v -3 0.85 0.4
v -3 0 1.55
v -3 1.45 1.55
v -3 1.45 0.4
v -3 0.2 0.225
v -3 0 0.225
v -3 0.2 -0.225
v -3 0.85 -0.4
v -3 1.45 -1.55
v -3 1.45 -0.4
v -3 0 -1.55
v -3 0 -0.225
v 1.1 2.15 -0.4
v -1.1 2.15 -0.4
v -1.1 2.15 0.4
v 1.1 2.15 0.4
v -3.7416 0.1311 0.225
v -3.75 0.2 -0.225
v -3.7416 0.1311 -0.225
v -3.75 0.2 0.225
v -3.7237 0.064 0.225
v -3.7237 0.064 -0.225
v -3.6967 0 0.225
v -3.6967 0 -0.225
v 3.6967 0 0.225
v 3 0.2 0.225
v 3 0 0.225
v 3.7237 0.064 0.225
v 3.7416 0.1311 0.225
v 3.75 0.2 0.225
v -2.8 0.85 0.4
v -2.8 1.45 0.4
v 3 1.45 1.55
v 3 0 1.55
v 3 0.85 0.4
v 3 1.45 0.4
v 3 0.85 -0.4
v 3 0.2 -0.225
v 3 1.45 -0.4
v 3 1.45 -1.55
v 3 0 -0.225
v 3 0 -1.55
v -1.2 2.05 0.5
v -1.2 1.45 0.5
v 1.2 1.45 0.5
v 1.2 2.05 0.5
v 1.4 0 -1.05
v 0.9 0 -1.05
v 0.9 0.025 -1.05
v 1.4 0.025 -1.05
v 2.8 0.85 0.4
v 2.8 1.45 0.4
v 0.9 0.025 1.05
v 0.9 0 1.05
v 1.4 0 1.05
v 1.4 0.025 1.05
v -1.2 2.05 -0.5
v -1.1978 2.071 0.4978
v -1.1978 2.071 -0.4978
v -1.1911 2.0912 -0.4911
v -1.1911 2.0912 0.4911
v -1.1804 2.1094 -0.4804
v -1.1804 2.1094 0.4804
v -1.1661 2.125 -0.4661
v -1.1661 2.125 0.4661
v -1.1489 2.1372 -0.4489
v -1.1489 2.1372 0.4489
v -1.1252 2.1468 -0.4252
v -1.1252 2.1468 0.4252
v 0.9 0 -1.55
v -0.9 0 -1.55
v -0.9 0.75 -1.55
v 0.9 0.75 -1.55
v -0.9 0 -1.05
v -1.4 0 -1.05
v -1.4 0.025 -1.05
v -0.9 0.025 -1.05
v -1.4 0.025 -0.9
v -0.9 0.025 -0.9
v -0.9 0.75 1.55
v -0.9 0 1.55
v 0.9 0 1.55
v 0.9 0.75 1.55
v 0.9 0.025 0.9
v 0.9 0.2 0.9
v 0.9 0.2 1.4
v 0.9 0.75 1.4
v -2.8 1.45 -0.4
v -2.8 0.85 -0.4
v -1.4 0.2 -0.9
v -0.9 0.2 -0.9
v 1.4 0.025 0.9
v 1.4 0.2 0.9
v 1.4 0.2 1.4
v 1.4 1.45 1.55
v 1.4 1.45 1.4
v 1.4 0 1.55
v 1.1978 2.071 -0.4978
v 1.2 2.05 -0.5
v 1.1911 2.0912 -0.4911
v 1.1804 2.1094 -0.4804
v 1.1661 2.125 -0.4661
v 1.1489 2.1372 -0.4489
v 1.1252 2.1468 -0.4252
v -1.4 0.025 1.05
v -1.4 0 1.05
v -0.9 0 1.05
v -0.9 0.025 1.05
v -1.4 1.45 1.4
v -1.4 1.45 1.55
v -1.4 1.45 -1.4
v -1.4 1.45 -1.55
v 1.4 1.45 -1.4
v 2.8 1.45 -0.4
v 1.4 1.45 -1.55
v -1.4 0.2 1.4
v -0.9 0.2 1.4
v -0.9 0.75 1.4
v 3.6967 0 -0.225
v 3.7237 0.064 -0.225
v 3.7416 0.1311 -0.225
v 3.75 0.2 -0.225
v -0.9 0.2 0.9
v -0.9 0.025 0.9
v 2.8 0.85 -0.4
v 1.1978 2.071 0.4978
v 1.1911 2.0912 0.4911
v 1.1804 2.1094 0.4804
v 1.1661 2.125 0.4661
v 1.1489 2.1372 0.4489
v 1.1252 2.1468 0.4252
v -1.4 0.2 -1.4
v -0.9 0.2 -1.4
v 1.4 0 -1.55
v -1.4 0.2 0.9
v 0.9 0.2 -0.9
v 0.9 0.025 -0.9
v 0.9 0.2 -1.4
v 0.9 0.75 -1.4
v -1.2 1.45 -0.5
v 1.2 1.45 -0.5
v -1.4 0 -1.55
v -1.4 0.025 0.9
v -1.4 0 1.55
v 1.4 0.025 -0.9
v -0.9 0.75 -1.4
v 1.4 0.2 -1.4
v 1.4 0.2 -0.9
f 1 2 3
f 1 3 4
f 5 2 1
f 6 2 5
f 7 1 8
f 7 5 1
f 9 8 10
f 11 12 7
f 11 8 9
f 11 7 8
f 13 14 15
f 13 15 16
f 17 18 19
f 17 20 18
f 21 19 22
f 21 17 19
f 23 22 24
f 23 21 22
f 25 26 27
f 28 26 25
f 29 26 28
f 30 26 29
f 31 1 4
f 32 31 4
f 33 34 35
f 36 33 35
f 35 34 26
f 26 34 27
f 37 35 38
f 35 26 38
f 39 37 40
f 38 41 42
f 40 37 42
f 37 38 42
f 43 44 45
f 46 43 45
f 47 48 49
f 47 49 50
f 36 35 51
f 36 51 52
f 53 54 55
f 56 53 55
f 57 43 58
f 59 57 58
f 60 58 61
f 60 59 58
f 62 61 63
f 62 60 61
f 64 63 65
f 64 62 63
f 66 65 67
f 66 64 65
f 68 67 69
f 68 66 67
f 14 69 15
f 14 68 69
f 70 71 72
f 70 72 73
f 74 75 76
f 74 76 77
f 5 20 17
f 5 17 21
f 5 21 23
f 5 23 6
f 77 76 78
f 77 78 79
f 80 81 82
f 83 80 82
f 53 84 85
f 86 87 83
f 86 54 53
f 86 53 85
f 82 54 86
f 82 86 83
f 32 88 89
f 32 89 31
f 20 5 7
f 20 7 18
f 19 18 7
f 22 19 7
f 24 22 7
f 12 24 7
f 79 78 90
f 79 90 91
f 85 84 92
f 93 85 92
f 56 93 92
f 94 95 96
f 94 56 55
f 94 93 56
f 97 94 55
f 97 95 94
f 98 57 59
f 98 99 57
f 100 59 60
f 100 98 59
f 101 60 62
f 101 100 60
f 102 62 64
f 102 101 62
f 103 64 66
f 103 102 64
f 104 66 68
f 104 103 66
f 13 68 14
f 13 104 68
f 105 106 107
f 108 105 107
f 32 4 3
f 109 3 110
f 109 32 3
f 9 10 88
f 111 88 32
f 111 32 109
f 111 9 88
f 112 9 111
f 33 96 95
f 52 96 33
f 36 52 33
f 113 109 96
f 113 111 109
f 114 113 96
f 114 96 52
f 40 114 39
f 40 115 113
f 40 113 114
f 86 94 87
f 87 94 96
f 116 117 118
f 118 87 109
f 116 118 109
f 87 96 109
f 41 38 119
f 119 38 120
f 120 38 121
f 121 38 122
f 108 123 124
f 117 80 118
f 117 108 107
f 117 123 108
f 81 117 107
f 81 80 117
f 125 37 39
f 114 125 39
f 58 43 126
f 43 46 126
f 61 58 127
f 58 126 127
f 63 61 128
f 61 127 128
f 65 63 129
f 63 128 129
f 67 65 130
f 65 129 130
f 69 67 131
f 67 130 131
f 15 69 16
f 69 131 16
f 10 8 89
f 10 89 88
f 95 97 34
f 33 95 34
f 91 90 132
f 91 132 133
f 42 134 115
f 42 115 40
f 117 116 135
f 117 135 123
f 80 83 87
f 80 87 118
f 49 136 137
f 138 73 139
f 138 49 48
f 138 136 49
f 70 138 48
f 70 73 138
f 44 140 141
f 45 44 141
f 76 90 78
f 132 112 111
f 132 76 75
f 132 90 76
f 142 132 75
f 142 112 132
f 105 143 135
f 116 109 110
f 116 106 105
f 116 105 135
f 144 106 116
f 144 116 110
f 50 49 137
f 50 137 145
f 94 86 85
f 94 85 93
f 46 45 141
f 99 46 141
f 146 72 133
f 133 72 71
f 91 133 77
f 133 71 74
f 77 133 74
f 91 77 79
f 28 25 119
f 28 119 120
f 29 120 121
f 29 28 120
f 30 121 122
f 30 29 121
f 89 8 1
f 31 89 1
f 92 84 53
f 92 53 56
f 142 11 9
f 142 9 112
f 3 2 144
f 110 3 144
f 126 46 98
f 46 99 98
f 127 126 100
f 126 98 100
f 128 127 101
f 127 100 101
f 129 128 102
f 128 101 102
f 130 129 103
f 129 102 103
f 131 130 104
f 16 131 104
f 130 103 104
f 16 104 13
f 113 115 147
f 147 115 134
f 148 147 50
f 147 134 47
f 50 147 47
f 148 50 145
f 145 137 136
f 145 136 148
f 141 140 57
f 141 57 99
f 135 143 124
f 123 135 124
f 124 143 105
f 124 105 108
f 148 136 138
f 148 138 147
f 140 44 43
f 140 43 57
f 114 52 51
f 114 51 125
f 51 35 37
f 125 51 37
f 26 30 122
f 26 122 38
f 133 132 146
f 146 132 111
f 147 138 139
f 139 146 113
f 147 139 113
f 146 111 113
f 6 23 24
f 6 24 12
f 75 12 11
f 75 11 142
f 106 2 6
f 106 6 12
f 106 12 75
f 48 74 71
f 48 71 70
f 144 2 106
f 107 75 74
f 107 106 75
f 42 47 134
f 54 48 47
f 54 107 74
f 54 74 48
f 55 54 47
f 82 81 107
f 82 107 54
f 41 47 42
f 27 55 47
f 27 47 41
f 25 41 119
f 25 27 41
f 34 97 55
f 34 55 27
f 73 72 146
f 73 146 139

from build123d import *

# Parameters (mm, degrees)
SKETCH1_W           = 6
SKETCH1_H           = 3.1
BOSS_EXTRUDE1_DEPTH = 1.45
SKETCH2_W           = 2.4
SKETCH2_H           = 1
BOSS_EXTRUDE2_DEPTH = 0.7
FILLET1_R           = 0.1
SKETCH3_W           = 0.8
SKETCH3_H           = 0.6
CUT_EXTRUDE1_DEPTH  = 0.2
SKETCH4_W           = 0.8
SKETCH4_H           = 0.6
CUT_EXTRUDE2_DEPTH  = 0.2
CUT_EXTRUDE3_DEPTH  = 0.15
CUT_EXTRUDE4_DEPTH  = 0.15
SKETCH7_W           = 0.5
SKETCH7_H           = 0.5
CUT_EXTRUDE5_DEPTH  = 0.2
BOSS_EXTRUDE4_DEPTH = 0.225
SKETCH9_W           = 5.2
SKETCH9_H           = 2.1
BOSS_EXTRUDE5_DEPTH = 0.025


with BuildPart() as part:
    # Sketch1 → Boss-Extrude1 (new body)
    with BuildSketch(Plane(origin=(0, 0, 0), x_dir=(1, 0, 0), z_dir=(0, 1, 0))):
        Rectangle(SKETCH1_W, SKETCH1_H)
    extrude(amount=BOSS_EXTRUDE1_DEPTH)

    # Sketch3 → Cut-Extrude1 (cut)
    with BuildSketch(Plane.ZY.offset(3)):
        with Locations((0, 1.15)):
            Rectangle(SKETCH3_W, SKETCH3_H)
    extrude(amount=-CUT_EXTRUDE1_DEPTH, mode=Mode.SUBTRACT)

    # Sketch4 → Cut-Extrude2 (cut)
    with BuildSketch(Plane(origin=(3, 0, 0), x_dir=(0, 0, -1), z_dir=(1, 0, 0))):
        with Locations((0, 1.15)):
            Rectangle(SKETCH4_W, SKETCH4_H)
    extrude(amount=-CUT_EXTRUDE2_DEPTH, mode=Mode.SUBTRACT)

    # Sketch5 → Cut-Extrude3 (cut)
    with BuildSketch(Plane.XY.offset(1.55)):
        Polygon((-1.4, 1.45), (1.4, 1.45), (1.4, 0), (0.9, 0), (0.9, 0.75), (-0.9, 0.75), (-0.9, 0), (-1.4, 0), align=None)
    extrude(amount=-CUT_EXTRUDE3_DEPTH, mode=Mode.SUBTRACT)

    # Sketch6 → Cut-Extrude4 (cut)
    with BuildSketch(Plane(origin=(0, 0, -1.55), x_dir=(-1, 0, 0), z_dir=(0, 0, -1))):
        Polygon((-1.4, 1.45), (1.4, 1.45), (1.4, 0), (0.9, 0), (0.9, 0.75), (-0.9, 0.75), (-0.9, 0), (-1.4, 0), align=None)
    extrude(amount=-CUT_EXTRUDE4_DEPTH, mode=Mode.SUBTRACT)

    # Sketch7 → Cut-Extrude5 (cut)
    with BuildSketch(Plane.XZ):
        with Locations((-1.15, 1.15)):
            Rectangle(SKETCH7_W, SKETCH7_H)
        with Locations((1.15, 1.15)):
            Rectangle(SKETCH7_W, SKETCH7_H)
        with Locations((1.15, -1.15)):
            Rectangle(SKETCH7_W, SKETCH7_H)
        with Locations((-1.15, -1.15)):
            Rectangle(SKETCH7_W, SKETCH7_H)
    extrude(amount=-CUT_EXTRUDE5_DEPTH, mode=Mode.SUBTRACT)



with BuildPart() as body_2:
    # Sketch2 → Boss-Extrude2 (new body)
    with BuildSketch(Plane(origin=(0, 1.45, 0), x_dir=(1, 0, 0), z_dir=(0, 1, 0))):
        Rectangle(SKETCH2_W, SKETCH2_H)
    extrude(amount=BOSS_EXTRUDE2_DEPTH)

    # Fillet1
    fillet1_edges = [body_2.edges().sort_by_distance(p)[0] for p in [
        (-1.2, 2.15, 0),
        (0, 2.15, 0.5),
        (1.2, 2.15, 0),
        (0, 2.15, -0.5),
    ]]
    fillet(fillet1_edges, radius=FILLET1_R)


with BuildPart() as body_3:
    # Sketch8 → Boss-Extrude4 (new, symmetric)
    with BuildSketch(Plane.XY):
        with BuildLine():
            Line((-3.69668524, 0), (3.69668524, 0))
            ThreePointArc((3.69668524, 0), (3.733805117, 0.097210972), (3.75, 0.2))
            Line((3.75, 0.2), (-3.75, 0.2))
            ThreePointArc((-3.75, 0.2), (-3.733805117, 0.097210972), (-3.69668524, 0))
        make_face()
    extrude(amount=BOSS_EXTRUDE4_DEPTH, both=True)


with BuildPart() as part_1:
    add(part.part)

    add(body_3.part)  # Boss-Extrude5 merges body 3
    # Sketch9 → Boss-Extrude5 (add)
    with BuildSketch(Plane(origin=(0, 0, 0), x_dir=(1, 0, 0), z_dir=(0, 1, 0))):
        Rectangle(SKETCH9_W, SKETCH9_H)
    extrude(amount=BOSS_EXTRUDE5_DEPTH)


solid = Compound([body_2.part, part_1.part])
